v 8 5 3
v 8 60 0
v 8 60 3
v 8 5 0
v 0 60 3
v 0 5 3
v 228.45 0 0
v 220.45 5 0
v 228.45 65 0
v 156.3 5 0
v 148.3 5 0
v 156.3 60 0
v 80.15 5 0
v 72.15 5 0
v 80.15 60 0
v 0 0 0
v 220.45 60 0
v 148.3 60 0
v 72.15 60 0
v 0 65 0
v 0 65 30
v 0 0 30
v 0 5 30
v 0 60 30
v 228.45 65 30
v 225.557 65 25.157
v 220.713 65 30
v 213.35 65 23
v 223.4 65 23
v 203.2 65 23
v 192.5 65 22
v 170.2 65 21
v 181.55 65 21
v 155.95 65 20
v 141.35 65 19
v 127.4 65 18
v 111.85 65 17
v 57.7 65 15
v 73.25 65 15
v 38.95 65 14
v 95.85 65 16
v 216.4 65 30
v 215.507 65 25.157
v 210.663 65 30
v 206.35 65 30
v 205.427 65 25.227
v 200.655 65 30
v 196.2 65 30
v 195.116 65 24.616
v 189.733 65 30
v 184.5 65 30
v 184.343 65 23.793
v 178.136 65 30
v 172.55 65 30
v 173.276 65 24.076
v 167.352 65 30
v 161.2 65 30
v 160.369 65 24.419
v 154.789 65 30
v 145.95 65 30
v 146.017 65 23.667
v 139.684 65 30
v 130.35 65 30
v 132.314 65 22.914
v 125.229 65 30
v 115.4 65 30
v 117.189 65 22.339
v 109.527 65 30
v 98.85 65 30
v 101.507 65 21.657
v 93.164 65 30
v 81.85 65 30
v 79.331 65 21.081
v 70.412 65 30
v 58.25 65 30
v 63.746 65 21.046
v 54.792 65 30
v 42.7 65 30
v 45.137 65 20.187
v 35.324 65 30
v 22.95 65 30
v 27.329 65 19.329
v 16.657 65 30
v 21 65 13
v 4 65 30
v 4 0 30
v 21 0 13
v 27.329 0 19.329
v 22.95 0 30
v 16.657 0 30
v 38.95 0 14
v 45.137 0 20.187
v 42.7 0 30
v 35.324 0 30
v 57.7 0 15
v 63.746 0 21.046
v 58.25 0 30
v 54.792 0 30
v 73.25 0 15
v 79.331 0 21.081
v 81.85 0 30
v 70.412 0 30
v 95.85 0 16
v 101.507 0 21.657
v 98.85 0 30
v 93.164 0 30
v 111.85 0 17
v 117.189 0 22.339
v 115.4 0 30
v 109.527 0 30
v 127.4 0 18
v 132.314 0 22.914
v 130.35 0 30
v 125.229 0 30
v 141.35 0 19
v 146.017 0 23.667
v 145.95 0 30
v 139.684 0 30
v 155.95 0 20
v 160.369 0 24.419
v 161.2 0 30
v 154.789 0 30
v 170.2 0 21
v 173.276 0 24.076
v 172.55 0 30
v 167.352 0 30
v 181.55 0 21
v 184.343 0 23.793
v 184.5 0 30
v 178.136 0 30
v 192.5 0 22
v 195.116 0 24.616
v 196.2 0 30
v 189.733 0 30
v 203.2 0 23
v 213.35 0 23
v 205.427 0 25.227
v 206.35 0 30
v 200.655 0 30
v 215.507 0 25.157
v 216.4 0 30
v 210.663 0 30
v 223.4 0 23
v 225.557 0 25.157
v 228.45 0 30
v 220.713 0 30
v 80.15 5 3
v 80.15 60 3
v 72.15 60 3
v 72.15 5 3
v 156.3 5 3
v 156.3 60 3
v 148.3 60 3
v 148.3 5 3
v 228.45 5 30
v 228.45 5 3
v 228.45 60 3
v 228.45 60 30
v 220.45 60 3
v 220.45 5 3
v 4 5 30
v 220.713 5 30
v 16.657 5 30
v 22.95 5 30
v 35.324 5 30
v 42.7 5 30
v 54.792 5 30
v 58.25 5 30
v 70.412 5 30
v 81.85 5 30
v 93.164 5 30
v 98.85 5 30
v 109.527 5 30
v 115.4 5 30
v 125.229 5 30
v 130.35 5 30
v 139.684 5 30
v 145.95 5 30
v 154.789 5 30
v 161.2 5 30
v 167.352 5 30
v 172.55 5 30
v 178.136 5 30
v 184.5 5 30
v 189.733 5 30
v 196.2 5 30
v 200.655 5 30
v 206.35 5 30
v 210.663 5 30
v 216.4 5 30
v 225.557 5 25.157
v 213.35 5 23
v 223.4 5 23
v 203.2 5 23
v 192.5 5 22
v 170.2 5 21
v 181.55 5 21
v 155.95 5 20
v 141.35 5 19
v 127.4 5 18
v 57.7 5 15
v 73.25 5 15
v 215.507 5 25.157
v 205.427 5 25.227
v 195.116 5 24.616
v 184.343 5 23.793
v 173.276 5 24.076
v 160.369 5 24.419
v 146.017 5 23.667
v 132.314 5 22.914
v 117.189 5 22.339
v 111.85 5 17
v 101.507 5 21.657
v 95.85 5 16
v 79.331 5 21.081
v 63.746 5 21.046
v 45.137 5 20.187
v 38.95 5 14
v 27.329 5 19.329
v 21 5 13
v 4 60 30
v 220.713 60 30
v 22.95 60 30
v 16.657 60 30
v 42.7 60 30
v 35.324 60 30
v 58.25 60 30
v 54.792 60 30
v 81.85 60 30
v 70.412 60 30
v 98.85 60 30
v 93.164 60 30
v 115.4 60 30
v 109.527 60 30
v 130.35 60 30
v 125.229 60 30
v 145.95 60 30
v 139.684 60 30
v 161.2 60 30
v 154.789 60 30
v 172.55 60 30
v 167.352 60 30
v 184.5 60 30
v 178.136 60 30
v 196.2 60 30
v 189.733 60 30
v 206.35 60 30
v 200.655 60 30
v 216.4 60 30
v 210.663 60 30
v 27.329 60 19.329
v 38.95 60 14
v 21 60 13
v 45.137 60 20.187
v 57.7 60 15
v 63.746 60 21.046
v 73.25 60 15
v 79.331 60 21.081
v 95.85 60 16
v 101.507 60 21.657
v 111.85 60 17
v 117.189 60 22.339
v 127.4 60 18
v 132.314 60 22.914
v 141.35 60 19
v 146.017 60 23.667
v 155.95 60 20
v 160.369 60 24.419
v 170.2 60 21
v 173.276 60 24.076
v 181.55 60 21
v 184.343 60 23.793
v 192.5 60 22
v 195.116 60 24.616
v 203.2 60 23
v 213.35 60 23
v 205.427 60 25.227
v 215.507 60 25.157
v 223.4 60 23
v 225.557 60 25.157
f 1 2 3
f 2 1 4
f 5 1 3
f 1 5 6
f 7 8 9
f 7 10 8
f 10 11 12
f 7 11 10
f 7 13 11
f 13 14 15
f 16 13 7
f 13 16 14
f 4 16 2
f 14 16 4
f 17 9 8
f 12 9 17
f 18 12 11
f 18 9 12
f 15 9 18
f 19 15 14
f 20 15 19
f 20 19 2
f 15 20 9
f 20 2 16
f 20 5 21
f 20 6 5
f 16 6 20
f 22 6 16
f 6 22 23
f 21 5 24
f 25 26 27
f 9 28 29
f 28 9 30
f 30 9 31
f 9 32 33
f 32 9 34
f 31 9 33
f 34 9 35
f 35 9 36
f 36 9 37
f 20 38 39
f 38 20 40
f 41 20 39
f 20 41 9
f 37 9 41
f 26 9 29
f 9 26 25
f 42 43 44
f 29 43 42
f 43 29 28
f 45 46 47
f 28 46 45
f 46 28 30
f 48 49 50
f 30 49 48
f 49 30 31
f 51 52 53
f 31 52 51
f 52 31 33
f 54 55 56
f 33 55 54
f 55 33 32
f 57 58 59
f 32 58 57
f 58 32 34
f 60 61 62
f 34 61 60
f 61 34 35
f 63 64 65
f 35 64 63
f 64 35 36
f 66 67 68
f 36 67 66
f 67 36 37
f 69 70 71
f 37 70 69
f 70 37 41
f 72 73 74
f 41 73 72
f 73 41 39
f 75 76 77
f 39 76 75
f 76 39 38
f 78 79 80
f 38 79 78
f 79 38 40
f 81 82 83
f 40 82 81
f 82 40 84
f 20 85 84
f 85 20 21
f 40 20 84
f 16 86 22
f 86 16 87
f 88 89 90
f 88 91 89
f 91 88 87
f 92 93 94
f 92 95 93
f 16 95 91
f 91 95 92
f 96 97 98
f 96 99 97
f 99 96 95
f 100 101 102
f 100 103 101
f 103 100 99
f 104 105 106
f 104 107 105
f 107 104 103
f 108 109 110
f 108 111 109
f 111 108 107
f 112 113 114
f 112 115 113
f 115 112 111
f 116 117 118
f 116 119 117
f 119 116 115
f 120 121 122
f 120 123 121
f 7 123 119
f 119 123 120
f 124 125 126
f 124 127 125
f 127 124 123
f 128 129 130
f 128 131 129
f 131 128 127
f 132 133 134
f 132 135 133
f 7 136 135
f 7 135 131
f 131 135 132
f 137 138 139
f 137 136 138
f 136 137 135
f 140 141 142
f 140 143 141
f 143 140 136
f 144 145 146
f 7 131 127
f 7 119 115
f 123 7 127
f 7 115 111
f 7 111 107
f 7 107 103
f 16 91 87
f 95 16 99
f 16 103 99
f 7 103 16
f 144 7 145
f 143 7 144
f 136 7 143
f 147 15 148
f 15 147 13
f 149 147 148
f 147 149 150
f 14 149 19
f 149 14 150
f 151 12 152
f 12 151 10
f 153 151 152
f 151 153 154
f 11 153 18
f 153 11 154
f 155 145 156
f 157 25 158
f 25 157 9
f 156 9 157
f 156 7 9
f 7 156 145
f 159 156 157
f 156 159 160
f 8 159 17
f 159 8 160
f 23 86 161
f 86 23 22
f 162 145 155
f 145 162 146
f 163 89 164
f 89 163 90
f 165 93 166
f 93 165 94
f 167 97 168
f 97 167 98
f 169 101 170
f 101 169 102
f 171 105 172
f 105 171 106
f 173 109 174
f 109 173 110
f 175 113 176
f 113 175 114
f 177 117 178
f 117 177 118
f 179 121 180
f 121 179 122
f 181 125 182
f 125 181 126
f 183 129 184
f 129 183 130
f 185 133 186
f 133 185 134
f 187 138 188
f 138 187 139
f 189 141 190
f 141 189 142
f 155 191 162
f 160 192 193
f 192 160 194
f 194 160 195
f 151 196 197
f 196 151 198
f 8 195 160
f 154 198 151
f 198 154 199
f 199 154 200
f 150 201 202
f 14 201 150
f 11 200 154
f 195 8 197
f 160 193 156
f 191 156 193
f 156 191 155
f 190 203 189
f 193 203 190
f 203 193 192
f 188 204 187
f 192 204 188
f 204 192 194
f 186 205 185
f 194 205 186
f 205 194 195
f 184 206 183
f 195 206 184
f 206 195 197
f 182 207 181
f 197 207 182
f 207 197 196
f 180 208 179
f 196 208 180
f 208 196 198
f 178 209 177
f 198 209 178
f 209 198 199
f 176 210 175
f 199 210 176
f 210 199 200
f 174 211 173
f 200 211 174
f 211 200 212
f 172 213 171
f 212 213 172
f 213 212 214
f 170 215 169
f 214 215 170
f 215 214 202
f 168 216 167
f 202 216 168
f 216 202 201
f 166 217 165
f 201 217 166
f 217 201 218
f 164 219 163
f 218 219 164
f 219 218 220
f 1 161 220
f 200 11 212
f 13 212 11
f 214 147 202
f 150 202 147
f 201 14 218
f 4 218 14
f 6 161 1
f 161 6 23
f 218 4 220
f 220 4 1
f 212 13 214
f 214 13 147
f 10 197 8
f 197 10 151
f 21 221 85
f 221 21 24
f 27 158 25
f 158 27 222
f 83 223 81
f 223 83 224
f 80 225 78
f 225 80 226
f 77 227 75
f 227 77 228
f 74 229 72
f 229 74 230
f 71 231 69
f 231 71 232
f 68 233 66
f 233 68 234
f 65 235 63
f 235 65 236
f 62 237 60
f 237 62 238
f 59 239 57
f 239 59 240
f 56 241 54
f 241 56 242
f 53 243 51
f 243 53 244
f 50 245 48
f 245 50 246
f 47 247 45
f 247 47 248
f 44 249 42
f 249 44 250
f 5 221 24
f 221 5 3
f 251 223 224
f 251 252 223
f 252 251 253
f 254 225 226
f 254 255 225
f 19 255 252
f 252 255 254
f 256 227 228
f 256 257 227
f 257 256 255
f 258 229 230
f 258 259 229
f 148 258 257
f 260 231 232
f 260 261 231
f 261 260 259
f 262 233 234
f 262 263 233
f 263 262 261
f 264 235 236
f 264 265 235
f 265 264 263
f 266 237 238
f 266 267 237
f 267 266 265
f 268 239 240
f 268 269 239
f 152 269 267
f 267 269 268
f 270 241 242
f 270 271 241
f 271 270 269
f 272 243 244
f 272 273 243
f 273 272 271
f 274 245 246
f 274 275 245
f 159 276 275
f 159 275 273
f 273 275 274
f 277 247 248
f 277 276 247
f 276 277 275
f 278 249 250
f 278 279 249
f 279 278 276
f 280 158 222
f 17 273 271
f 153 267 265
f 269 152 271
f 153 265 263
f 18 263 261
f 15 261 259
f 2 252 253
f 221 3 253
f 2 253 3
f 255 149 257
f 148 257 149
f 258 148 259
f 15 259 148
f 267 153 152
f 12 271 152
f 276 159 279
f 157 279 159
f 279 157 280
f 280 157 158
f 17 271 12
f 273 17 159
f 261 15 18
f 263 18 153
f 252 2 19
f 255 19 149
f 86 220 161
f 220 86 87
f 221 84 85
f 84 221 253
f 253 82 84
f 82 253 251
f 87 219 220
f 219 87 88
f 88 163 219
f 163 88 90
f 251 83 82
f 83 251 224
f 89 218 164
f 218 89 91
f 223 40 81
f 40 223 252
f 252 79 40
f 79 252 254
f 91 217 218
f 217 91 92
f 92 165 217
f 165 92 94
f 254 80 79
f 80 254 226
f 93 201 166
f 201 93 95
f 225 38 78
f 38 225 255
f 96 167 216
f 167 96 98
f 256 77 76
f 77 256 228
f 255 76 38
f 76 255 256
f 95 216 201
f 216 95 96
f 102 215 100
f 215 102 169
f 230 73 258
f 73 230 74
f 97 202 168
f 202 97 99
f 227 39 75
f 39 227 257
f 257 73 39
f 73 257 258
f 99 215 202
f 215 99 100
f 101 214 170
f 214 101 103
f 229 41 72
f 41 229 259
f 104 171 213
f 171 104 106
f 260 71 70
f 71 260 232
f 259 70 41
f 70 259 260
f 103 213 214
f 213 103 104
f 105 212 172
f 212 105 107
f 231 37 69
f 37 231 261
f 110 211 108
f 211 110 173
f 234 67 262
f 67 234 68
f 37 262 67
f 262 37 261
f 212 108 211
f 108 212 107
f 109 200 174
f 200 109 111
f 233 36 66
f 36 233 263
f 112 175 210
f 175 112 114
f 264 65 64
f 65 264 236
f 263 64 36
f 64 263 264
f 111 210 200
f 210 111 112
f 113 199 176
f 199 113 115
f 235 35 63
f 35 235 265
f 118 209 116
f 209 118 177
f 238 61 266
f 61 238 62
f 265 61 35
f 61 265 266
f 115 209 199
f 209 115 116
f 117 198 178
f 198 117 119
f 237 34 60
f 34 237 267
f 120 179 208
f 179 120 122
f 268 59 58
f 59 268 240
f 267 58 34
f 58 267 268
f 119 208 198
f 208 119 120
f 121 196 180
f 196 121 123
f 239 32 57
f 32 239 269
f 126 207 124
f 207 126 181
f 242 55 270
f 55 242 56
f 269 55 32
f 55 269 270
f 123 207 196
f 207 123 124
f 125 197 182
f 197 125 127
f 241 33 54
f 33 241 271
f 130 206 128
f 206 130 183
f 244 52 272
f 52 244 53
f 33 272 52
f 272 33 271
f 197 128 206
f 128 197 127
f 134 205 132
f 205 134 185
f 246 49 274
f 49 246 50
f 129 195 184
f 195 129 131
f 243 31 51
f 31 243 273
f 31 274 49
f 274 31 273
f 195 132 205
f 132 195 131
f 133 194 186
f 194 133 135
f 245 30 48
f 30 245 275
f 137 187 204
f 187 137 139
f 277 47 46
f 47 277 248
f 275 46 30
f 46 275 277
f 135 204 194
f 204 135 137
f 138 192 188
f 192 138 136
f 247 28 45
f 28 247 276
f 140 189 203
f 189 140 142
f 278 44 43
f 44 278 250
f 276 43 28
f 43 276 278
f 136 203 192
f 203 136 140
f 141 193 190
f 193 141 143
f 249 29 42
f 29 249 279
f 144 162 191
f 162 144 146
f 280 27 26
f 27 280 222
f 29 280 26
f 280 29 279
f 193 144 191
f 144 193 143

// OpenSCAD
//                   22     21     19     18     17     15     14     13     12     11     10      9      8      7      6
widths        = [  8.95,  8.75,  8.55,  8.60,  8.00,  7.55,  6.95,  6.60,  6.25,  4.35,  3.95,  3.70,  3.15,  3.05,  3.05];
spacing       = [  9,    10,     7,    14,     8,     8,     7,     8,     8,     7,     7,     7,     7,     7,     7];
pocket_depth  = [ 17,    16,    15,    15,    14,    13,    12,    11,    10,     9,     9,     8,     7,     7,     7];

base_width   = 65.0;
rail_width   =  5.0;
rail_height  = 30.0;
cross_height =  3.0;
cross_bars   =  4;

function sum (v, i = 0, r = 0) = i < len (v) ? sum (v, i + 1, r + v [i]) : r;
function subarray (list, begin = 0, end = -1) = [
  let (end = end < 0 ? len (list) : end)
    for (i = [begin : 1 : end - 1])
      list [i]
];

length = sum (widths) + sum (spacing) + 16;

difference () {
  union () {
    for (i = [0 : cross_bars - 1])
      translate ([i == 0 ? 0 : ((length / (cross_bars - 1)) * i) - (i == (cross_bars - 1) ? 8 : 4), 0, 0])
        cube ([8, base_width, cross_height]);
    translate ([0, 0, 0])
      cube ([length, rail_width, rail_height]);
    translate ([0, base_width - rail_width, 0])
      cube ([length, rail_width, rail_height]);
  }

  for (i = [0 : len (widths) - 1]) {
    translate ([21 + sum (subarray (spacing, 0, i)) + sum (subarray (widths, 0, i)), -0.01, rail_height - pocket_depth [i]])
      rotate ([0, 315, 0])
        cube ([widths [i], base_width + 0.02, 25]);
  }
}
